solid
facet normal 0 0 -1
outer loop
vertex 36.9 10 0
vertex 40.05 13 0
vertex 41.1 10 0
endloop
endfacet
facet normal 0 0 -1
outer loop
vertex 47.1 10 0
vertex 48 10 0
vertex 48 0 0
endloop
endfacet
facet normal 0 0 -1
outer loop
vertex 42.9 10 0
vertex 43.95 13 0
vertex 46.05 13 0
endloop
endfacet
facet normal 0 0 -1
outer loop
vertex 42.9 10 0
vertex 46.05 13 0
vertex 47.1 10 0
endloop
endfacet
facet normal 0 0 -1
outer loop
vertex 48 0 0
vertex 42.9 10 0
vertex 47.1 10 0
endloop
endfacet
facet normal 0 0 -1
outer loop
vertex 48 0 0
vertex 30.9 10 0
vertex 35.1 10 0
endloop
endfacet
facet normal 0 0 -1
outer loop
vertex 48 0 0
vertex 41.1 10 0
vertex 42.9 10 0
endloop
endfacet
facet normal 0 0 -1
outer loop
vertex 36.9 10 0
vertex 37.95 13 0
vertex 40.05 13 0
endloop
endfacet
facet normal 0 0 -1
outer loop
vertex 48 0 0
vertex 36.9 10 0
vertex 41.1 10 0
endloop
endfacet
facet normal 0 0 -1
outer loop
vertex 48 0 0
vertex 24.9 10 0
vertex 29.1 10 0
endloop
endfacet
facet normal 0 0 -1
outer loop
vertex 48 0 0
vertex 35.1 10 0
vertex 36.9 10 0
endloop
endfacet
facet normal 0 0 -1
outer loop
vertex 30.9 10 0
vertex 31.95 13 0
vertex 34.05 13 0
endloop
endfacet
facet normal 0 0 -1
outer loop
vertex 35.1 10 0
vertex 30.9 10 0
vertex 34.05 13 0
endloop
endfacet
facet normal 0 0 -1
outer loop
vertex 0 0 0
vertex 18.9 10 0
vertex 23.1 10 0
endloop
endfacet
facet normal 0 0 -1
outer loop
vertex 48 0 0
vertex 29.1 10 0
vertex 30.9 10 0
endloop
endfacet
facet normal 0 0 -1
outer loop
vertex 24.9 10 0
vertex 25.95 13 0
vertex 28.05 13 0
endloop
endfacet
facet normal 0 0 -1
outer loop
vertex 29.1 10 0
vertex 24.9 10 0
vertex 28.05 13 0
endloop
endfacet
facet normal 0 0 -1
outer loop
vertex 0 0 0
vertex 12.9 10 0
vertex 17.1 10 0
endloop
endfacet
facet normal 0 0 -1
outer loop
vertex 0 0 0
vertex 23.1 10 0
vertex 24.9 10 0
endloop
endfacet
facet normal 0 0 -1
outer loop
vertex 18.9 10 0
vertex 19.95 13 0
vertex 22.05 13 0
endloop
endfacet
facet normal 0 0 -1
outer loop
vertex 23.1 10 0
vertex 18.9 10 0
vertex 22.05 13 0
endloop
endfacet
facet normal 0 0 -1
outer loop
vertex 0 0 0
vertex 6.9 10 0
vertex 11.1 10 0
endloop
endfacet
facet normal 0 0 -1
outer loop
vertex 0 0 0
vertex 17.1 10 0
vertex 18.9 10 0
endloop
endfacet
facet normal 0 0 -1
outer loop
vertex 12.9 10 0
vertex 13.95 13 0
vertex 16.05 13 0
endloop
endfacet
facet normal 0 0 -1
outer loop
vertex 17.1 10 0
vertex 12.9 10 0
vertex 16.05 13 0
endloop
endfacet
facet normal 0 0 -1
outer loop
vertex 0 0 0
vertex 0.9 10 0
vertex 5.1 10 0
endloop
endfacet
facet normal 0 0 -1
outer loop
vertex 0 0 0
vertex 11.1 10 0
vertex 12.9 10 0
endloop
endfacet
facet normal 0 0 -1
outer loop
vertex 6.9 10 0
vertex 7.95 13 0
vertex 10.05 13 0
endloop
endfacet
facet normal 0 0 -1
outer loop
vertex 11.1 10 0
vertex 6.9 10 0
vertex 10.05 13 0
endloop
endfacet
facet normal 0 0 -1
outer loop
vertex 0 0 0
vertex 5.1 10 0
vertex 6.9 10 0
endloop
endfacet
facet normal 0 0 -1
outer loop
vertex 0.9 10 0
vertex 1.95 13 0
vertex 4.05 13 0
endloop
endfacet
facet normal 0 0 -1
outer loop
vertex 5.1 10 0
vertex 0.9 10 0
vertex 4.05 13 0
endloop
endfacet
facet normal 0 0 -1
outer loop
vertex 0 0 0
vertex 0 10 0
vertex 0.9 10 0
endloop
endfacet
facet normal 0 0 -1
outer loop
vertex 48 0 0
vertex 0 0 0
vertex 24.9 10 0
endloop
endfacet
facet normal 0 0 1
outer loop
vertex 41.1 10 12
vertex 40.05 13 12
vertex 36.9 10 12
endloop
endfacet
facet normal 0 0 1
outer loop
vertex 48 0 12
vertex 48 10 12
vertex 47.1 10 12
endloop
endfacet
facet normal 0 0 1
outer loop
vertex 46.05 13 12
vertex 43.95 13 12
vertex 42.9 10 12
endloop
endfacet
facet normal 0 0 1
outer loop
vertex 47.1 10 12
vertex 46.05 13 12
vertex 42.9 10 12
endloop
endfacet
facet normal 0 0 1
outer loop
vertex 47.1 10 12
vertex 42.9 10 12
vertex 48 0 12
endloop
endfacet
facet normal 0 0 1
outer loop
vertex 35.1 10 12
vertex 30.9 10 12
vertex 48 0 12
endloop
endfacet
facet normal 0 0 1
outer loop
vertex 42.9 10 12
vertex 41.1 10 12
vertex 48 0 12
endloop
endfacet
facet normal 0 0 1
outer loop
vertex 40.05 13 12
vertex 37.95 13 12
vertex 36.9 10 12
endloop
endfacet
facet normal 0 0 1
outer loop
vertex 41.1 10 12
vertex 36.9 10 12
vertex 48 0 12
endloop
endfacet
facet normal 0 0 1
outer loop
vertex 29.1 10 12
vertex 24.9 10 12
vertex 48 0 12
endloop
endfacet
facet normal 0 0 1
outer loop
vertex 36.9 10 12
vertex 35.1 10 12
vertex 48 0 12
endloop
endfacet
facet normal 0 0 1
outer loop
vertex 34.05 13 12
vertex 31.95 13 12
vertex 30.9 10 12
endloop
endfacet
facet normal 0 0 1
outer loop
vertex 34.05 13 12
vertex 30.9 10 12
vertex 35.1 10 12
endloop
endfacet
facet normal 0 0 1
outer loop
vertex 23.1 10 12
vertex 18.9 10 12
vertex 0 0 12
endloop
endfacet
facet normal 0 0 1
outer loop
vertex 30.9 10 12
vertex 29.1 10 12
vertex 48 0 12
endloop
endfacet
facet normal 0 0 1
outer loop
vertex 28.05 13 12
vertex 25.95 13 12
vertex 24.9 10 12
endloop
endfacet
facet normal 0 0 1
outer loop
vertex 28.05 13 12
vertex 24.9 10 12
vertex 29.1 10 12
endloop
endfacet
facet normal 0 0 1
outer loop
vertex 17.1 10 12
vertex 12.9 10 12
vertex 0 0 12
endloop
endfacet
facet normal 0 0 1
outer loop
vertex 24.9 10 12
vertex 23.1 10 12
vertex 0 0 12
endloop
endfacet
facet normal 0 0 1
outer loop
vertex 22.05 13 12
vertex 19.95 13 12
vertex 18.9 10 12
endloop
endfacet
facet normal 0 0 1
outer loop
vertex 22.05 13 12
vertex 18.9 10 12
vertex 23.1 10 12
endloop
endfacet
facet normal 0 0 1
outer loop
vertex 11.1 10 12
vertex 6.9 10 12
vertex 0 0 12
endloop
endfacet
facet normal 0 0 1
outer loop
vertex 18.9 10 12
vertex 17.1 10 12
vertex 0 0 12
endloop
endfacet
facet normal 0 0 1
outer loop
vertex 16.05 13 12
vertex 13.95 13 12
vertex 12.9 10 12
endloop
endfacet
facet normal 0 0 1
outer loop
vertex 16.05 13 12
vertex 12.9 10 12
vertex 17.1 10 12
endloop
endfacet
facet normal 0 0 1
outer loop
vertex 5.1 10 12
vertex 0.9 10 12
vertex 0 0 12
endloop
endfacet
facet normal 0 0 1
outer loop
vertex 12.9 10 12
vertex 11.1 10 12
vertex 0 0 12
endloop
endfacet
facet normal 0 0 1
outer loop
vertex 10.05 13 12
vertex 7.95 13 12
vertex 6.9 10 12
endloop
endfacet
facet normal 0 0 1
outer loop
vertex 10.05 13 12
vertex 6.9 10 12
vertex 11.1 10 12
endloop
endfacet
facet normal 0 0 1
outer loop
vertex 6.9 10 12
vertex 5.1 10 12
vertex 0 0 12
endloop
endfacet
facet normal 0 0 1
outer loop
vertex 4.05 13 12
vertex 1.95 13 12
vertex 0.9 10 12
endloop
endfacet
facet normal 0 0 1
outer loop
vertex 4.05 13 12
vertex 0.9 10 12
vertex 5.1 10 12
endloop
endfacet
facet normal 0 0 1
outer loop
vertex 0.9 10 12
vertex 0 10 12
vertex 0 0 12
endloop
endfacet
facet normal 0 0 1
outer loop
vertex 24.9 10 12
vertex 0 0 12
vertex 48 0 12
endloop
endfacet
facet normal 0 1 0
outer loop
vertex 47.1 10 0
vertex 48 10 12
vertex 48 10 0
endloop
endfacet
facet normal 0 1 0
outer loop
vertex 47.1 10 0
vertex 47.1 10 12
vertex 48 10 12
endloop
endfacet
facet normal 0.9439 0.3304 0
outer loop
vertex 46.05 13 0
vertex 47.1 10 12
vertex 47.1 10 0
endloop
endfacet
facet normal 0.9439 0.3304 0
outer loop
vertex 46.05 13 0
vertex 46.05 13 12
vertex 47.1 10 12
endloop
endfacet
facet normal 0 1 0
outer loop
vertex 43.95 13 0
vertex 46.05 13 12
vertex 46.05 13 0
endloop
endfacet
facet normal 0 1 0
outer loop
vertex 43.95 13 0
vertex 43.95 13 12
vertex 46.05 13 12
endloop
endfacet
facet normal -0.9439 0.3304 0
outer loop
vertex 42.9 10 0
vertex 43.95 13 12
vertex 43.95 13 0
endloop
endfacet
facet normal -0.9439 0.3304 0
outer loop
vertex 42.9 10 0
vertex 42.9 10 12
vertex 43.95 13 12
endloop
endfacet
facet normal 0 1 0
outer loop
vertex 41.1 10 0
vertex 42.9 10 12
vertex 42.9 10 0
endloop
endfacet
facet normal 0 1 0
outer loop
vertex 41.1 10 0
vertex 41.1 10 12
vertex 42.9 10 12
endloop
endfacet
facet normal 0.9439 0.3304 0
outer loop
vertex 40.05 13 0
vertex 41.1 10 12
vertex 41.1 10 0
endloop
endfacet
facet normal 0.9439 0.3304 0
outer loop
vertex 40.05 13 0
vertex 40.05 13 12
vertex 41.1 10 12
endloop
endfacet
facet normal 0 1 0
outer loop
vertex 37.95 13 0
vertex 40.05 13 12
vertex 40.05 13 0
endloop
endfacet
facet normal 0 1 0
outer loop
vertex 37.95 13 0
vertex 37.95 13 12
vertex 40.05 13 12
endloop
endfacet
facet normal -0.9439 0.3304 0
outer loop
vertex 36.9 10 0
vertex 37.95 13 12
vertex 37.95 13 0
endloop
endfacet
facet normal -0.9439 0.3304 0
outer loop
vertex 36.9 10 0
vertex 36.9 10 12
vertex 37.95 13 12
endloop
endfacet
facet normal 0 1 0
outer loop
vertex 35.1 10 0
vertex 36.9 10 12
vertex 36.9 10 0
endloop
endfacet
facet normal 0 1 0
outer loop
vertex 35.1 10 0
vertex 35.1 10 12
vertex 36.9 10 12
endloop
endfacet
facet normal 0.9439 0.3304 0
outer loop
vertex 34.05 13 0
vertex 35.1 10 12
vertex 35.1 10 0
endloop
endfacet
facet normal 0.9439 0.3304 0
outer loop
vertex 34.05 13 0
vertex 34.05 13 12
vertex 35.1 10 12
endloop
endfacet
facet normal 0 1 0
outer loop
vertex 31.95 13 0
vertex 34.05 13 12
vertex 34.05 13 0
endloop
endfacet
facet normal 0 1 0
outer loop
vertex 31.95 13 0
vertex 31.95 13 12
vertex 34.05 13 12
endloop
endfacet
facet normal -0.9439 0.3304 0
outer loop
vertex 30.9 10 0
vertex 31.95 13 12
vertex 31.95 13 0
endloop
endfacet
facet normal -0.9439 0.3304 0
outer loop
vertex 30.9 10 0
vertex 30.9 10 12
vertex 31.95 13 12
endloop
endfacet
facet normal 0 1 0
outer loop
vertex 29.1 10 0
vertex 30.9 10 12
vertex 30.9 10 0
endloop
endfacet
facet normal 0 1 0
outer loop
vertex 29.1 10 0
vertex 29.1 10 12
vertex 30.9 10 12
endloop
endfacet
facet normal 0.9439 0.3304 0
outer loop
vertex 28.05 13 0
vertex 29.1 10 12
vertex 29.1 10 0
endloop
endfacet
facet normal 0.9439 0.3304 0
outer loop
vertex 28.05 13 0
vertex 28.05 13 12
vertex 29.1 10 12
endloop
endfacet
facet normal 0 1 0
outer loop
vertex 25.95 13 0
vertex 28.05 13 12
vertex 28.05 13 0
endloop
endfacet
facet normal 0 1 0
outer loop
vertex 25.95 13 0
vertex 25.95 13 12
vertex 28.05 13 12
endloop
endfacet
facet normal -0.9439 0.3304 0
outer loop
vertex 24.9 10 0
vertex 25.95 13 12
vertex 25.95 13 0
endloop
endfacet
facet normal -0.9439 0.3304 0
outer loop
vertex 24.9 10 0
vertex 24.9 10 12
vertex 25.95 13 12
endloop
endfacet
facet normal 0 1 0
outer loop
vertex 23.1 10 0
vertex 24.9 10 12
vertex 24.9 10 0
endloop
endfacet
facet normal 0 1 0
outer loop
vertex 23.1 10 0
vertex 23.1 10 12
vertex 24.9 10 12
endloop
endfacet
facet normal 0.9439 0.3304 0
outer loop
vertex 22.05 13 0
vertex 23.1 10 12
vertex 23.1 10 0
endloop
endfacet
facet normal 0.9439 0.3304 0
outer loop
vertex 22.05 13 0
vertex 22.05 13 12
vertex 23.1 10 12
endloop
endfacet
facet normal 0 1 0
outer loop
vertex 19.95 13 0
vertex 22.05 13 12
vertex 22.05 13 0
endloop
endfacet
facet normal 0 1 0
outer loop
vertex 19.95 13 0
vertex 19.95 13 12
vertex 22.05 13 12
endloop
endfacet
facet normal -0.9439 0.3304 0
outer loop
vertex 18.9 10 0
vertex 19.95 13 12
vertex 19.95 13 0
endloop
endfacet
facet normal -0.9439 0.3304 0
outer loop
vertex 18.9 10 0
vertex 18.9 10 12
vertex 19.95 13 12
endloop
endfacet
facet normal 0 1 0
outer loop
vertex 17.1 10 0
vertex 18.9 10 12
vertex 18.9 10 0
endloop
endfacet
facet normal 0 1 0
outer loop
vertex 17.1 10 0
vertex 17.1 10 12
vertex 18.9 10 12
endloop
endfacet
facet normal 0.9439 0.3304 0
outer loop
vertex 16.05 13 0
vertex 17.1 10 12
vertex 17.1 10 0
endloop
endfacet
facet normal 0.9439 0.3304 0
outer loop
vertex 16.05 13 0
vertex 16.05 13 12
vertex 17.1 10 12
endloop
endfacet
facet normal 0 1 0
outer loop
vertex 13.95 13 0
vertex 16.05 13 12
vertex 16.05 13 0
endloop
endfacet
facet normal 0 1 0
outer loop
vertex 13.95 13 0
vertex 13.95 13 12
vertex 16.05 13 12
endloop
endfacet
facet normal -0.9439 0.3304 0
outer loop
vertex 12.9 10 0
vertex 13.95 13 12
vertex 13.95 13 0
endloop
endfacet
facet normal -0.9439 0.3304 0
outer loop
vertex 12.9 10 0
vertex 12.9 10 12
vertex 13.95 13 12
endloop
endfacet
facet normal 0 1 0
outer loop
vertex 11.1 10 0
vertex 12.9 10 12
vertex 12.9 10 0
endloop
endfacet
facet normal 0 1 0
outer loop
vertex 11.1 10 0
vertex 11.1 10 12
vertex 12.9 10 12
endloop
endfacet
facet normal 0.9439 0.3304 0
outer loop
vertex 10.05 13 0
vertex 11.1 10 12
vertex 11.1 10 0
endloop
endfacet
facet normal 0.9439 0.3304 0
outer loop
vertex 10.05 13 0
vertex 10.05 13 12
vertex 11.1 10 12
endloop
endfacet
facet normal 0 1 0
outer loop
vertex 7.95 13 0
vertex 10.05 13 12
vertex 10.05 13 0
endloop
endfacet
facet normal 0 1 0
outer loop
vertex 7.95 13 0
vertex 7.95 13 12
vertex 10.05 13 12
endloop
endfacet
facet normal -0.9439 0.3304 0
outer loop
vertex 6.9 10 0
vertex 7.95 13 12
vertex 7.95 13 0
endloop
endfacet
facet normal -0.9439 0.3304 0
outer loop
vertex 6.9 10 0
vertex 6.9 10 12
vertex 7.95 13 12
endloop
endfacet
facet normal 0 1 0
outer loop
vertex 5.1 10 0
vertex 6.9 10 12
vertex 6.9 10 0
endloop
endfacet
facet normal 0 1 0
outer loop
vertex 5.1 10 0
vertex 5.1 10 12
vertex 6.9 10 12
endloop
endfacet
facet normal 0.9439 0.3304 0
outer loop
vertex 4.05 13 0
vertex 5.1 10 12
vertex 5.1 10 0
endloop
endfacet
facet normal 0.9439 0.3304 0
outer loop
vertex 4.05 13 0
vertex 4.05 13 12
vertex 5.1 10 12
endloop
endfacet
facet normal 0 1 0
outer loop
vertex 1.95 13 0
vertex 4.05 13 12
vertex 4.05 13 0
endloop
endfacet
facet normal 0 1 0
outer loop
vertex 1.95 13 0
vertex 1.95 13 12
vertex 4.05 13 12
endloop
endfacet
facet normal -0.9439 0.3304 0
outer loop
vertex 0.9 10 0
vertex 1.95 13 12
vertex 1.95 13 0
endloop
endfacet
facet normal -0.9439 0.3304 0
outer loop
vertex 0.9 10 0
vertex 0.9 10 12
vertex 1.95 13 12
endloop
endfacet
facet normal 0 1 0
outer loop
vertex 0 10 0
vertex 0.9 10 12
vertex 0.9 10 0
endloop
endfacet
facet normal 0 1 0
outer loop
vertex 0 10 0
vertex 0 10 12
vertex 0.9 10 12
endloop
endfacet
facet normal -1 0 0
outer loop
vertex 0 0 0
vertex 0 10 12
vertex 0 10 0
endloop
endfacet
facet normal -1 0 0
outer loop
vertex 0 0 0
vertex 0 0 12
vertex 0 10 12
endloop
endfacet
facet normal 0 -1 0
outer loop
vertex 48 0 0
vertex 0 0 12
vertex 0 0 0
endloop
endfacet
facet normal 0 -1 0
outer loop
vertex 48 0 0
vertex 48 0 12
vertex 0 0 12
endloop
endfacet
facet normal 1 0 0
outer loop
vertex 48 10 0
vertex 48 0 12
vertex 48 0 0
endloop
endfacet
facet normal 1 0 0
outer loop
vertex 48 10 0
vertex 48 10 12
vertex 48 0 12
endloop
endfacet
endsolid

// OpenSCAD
$fn = 32;

// ----------------------------------------------------------------------
// Gear rack: 8 teeth, pitch 6 mm
// ----------------------------------------------------------------------

// --- parameters (mm) ---
teeth = 8;                // number of teeth
pitch = 6;                // tooth pitch, X
root_w = 4.2;             // tooth width at the root
tip_w = 2.1;              // tooth width at the tip
base_h = 10;              // rack body height, Y
tooth_h = 3;              // tooth height above the body
plate_t = 12;             // rack width, Z (extrusion height)

rack_l = teeth * pitch;  // overall length
total_h = base_h + tooth_h;  // overall height

profile = [[0, 0], [48, 0], [48, 10], [47.1, 10], [46.05, 13], [43.95, 13], [42.9, 10], [41.1, 10], [40.05, 13], [37.95, 13], [36.9, 10], [35.1, 10], [34.05, 13], [31.95, 13], [30.9, 10], [29.1, 10], [28.05, 13], [25.95, 13], [24.9, 10], [23.1, 10], [22.05, 13], [19.95, 13], [18.9, 10], [17.1, 10], [16.05, 13], [13.95, 13], [12.9, 10], [11.1, 10], [10.05, 13], [7.95, 13], [6.9, 10], [5.1, 10], [4.05, 13], [1.95, 13], [0.9, 10], [0, 10]];  // primary outline, 36 points, counter clockwise

// --- the one profile operation ---
linear_extrude(height = plate_t) polygon(points = profile);
